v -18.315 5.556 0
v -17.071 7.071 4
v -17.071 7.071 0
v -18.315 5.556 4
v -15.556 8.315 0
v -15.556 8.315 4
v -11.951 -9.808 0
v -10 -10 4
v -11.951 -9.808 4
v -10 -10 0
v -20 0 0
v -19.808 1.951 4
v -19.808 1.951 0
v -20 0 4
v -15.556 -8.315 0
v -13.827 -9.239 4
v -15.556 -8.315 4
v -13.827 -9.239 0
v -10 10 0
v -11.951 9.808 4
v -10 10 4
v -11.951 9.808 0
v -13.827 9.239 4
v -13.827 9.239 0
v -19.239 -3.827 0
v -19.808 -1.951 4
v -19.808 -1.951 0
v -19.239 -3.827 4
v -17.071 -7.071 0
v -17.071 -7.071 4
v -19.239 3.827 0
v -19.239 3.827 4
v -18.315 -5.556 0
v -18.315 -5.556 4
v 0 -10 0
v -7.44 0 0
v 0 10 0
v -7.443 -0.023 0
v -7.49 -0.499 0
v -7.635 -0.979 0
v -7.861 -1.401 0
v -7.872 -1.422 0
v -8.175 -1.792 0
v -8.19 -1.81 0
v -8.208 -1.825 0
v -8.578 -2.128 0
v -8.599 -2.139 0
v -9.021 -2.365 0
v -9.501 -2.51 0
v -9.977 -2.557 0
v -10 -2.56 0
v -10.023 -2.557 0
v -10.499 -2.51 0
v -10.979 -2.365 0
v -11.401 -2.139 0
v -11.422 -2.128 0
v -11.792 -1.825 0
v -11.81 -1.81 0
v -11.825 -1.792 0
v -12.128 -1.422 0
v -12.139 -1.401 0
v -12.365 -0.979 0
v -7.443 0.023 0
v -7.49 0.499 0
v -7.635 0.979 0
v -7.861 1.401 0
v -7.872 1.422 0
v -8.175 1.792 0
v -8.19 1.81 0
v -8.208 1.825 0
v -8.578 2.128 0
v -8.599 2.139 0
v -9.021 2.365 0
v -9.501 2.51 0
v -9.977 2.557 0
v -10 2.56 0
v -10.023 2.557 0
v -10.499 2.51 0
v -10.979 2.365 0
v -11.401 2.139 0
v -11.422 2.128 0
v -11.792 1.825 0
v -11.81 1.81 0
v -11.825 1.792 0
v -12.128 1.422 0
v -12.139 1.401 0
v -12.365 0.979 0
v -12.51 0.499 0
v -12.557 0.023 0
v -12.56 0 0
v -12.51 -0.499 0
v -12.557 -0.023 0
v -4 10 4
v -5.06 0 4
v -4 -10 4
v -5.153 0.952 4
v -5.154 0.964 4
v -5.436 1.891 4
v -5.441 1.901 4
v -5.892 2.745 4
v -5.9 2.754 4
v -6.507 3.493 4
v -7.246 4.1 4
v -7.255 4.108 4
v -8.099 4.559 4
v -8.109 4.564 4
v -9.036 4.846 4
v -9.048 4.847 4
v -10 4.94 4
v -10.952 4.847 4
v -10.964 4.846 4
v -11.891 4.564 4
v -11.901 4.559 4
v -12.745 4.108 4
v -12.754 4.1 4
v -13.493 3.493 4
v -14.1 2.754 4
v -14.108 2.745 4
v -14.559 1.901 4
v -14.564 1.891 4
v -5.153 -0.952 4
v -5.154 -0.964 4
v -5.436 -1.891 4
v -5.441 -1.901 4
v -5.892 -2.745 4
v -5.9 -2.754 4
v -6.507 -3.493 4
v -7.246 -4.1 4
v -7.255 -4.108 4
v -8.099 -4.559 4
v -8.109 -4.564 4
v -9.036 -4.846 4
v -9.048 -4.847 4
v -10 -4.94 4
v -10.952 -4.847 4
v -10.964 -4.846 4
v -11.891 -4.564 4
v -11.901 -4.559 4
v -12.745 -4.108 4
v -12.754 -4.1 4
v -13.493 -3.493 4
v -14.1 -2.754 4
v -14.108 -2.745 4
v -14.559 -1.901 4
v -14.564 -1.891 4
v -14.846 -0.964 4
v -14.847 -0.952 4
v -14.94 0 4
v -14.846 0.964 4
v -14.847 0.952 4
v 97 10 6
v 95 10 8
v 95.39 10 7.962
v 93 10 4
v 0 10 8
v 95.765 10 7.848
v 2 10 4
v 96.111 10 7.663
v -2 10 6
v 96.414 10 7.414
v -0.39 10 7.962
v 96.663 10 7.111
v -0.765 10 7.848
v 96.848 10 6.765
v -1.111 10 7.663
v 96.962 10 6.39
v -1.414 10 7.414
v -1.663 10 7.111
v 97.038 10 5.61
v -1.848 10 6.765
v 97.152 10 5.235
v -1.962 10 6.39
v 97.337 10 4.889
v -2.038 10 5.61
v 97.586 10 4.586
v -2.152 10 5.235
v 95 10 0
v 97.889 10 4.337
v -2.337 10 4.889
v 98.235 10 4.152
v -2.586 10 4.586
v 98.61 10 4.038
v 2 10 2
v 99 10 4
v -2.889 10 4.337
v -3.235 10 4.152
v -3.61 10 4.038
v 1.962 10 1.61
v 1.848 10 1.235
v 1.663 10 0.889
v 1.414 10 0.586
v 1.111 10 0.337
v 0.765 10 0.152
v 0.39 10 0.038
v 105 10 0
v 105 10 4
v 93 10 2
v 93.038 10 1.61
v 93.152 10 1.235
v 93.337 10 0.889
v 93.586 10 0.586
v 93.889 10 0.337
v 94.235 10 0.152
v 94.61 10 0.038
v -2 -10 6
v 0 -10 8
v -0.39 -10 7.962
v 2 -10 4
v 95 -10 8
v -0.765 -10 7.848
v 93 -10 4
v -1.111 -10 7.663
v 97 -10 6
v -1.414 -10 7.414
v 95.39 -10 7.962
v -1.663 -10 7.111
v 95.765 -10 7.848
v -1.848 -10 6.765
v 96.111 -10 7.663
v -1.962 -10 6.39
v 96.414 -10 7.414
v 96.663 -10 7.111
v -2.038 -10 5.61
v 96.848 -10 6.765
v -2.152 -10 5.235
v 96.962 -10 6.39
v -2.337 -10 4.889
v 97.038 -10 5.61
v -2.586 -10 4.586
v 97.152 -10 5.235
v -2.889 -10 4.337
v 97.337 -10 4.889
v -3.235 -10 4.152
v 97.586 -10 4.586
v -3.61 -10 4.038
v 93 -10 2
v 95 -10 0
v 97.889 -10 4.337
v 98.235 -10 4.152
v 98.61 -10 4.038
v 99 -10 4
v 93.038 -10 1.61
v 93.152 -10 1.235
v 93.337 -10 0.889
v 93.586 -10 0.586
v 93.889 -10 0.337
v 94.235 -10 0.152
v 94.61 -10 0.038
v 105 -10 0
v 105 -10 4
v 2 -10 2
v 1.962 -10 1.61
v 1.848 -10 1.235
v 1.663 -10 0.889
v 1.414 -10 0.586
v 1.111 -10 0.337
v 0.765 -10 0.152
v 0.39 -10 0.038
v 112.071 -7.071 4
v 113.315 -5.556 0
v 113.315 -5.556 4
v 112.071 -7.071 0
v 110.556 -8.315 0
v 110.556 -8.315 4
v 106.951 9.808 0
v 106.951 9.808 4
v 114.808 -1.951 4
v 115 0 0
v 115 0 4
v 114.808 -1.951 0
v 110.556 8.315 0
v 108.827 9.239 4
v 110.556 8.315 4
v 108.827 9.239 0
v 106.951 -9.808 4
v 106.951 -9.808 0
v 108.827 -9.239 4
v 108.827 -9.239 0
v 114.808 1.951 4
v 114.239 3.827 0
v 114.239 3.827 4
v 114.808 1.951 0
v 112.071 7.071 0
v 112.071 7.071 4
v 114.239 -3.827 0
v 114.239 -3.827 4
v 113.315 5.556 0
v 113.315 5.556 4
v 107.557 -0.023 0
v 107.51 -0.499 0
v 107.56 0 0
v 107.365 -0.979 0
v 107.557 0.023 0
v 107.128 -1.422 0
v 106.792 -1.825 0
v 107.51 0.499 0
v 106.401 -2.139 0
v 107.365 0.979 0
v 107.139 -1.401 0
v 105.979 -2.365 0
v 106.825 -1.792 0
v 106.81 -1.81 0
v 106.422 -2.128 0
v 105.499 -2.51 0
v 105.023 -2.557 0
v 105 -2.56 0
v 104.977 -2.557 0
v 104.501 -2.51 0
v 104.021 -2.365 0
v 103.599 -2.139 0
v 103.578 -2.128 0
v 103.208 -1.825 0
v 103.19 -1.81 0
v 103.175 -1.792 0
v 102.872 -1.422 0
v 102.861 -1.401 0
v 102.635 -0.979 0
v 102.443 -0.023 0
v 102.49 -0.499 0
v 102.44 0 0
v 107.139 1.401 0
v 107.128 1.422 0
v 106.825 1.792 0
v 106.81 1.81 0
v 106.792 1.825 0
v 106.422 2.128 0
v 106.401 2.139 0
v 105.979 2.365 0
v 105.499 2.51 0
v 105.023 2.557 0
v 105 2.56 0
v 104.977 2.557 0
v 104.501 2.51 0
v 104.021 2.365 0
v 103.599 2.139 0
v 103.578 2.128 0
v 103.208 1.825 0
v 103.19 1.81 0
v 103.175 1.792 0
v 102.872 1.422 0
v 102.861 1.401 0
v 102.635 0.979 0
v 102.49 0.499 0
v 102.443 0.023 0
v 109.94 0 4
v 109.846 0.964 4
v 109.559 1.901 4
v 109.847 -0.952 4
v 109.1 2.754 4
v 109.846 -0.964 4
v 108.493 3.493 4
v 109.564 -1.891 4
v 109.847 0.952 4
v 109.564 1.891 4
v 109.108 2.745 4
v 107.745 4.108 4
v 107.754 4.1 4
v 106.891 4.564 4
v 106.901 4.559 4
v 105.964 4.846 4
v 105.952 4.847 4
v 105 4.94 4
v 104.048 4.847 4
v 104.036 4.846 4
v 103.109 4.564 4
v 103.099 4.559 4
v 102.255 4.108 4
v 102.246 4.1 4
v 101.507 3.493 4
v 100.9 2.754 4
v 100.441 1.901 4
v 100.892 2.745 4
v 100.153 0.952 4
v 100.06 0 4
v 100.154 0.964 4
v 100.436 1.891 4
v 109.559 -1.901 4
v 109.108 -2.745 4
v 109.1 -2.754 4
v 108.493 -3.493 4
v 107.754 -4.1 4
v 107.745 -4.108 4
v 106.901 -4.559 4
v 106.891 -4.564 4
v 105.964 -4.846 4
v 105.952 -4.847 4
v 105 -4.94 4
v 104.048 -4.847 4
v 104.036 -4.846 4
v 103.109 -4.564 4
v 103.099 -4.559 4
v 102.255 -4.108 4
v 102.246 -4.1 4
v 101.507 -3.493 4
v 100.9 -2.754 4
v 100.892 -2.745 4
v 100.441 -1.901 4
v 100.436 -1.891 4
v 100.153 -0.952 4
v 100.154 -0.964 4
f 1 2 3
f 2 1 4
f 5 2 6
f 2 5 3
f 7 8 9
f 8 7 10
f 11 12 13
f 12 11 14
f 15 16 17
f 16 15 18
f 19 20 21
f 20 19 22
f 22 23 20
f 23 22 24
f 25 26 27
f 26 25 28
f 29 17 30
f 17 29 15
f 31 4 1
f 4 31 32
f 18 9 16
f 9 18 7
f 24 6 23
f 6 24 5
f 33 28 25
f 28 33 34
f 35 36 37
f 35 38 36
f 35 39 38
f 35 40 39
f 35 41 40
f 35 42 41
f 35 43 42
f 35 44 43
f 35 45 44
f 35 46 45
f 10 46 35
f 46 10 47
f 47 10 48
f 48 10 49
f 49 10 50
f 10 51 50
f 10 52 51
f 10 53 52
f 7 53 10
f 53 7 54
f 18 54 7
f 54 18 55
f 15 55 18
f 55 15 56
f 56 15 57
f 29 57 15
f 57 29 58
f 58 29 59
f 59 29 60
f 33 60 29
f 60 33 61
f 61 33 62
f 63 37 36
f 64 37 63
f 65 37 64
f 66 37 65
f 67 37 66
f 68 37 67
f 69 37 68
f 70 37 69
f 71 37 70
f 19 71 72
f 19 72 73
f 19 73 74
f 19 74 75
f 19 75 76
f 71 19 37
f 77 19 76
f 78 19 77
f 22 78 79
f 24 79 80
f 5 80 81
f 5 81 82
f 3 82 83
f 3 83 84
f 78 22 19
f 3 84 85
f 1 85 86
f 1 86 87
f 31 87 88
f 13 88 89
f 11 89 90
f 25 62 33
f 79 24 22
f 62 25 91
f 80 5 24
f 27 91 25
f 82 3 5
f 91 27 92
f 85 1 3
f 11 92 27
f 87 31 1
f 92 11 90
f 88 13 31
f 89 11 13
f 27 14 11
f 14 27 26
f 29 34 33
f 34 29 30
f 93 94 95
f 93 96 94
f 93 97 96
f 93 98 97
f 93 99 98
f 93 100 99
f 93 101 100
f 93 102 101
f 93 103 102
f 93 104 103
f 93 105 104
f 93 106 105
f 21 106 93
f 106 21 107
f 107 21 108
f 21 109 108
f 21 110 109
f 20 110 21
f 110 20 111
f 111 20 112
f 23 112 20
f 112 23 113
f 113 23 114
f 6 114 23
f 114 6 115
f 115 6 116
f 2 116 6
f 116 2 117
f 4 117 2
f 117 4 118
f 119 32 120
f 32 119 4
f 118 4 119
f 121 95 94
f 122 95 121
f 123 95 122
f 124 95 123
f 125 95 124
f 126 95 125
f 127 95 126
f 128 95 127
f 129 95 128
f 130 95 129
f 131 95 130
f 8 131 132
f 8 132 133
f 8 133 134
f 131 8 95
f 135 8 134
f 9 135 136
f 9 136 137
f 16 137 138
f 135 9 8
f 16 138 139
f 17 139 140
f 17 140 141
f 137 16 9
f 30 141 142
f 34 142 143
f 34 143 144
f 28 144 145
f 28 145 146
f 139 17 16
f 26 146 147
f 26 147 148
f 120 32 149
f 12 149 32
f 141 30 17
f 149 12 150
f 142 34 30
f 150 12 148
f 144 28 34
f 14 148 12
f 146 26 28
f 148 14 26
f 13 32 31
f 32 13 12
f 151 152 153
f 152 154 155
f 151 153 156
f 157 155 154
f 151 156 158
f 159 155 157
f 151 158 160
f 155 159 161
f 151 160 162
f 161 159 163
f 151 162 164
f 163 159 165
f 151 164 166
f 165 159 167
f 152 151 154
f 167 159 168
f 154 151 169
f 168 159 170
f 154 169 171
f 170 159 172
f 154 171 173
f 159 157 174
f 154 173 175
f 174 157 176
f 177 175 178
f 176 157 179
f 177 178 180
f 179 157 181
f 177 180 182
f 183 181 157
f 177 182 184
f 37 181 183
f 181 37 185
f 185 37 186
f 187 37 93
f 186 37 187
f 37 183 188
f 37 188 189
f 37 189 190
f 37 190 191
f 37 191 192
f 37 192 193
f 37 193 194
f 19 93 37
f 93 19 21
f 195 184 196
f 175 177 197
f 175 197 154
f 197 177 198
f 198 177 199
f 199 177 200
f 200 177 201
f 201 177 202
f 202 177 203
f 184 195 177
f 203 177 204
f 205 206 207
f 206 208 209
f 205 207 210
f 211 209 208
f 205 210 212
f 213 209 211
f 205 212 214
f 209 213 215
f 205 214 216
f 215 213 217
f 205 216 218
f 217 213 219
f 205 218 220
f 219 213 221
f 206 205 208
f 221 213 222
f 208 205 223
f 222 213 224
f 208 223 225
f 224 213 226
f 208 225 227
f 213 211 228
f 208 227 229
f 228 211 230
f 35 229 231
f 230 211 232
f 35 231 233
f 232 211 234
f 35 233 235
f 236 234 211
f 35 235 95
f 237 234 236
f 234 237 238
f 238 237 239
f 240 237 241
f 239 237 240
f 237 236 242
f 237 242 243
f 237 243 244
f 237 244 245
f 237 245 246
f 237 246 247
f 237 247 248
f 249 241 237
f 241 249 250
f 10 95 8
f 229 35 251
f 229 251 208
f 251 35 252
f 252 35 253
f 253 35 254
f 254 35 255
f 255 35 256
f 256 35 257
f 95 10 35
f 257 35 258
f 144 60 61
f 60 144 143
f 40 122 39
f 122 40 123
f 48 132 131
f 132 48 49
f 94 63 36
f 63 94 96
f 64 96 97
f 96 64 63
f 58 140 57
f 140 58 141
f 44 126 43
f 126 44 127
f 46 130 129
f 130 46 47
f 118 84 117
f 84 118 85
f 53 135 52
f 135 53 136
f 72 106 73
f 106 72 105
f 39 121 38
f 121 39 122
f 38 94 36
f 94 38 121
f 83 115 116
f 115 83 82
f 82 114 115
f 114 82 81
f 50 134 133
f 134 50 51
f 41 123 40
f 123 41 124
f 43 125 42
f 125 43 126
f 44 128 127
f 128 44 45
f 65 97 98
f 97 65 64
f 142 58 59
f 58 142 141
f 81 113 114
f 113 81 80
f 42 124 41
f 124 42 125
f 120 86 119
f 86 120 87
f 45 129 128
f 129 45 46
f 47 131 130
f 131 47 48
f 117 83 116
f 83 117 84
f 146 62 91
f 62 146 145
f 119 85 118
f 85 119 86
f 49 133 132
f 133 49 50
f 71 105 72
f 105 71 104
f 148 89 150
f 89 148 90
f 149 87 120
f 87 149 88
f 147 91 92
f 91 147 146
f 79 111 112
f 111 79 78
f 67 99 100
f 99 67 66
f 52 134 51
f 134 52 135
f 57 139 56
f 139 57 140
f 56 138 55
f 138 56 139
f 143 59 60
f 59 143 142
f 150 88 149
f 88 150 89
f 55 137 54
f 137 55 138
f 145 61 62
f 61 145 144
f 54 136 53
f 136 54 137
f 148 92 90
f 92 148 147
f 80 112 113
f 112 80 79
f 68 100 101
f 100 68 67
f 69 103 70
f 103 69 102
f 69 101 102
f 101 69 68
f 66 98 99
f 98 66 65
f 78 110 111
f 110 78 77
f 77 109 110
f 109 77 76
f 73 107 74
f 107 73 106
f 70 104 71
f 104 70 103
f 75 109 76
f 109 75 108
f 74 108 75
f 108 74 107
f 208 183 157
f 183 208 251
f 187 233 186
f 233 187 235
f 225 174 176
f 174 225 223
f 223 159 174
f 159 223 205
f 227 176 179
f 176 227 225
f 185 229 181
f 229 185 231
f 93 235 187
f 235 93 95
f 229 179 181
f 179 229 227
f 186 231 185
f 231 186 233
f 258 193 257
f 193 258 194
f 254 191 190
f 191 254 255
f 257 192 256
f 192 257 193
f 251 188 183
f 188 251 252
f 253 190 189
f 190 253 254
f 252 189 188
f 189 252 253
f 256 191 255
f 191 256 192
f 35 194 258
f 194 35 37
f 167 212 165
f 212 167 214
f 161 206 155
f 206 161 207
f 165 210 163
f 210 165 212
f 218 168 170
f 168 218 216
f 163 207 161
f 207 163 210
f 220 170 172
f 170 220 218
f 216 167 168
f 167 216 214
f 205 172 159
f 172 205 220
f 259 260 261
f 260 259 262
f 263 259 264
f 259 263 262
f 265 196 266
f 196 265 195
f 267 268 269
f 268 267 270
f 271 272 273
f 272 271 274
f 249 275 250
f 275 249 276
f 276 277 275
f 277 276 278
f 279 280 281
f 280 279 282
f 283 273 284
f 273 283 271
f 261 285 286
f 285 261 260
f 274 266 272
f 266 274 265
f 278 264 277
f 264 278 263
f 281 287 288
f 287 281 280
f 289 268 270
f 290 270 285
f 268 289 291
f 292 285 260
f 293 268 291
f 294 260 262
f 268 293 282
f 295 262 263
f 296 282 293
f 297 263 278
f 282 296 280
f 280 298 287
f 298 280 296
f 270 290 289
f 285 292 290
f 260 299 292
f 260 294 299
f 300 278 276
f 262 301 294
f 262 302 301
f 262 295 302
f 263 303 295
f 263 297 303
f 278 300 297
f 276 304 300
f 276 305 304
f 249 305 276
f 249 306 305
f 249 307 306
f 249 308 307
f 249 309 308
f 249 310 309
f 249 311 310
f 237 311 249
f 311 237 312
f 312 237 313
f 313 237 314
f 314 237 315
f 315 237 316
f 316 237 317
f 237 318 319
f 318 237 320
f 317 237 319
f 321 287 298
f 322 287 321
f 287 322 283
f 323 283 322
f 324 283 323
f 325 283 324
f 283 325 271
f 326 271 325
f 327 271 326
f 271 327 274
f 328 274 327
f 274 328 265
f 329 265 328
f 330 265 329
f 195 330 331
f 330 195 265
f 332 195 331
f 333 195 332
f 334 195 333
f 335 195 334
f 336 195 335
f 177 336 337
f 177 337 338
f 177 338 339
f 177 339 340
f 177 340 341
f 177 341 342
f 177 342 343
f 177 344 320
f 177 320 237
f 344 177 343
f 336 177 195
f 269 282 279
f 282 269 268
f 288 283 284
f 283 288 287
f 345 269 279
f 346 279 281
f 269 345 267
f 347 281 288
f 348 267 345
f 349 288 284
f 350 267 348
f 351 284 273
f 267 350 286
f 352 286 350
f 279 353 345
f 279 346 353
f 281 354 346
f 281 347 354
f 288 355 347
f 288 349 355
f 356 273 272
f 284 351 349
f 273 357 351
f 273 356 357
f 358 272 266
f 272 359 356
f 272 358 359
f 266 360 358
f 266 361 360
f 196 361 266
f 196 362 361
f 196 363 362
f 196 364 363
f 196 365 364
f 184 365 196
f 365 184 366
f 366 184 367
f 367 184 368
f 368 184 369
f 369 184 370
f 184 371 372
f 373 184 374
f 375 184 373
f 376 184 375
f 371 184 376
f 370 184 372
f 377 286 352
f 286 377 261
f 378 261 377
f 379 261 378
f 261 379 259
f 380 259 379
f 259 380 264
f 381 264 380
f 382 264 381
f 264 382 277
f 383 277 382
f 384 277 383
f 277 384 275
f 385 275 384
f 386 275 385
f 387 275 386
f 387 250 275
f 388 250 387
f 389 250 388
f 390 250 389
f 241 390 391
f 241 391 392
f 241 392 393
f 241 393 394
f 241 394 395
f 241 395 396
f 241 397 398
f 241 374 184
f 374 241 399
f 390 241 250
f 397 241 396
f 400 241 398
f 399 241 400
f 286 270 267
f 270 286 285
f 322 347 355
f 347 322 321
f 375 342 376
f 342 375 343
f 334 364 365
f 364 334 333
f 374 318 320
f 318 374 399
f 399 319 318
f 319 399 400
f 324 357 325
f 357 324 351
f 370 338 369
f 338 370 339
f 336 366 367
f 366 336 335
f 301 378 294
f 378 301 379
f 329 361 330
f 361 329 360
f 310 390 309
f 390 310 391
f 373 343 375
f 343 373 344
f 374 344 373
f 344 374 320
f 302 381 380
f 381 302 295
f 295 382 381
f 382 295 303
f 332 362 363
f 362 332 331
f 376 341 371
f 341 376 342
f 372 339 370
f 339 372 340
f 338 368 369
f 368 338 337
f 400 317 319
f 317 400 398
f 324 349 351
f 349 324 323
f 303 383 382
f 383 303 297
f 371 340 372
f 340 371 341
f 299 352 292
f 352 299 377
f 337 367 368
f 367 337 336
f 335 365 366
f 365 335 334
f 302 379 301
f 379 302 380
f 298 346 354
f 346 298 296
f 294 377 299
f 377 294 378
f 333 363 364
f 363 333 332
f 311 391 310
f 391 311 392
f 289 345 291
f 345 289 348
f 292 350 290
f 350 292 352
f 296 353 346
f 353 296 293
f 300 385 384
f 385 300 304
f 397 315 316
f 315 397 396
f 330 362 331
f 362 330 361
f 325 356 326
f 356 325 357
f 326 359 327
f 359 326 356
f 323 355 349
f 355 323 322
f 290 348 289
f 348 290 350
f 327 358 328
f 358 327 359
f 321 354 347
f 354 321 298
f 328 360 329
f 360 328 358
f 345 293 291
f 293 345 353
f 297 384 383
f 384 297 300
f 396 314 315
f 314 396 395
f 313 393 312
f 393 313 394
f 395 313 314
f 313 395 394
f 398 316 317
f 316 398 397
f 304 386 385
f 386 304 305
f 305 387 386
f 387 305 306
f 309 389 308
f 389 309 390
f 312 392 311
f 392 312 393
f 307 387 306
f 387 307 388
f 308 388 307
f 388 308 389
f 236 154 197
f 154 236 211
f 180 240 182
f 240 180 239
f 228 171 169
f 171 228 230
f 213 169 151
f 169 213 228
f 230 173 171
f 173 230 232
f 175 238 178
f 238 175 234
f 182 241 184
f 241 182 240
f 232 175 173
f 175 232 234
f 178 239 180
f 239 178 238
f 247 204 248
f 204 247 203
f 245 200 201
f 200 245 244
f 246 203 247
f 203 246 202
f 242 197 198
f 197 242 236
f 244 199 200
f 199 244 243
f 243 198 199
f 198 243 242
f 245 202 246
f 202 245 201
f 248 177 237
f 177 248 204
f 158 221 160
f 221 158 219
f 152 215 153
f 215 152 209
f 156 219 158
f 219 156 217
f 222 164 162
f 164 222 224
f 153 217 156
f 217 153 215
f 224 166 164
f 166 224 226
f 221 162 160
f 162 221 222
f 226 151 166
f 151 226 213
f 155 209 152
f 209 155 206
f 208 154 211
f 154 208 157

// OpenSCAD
$fn=32;

//translate([2,-10,0]) color("red") cube([91,20,4]);


ear();
translate([0,-10,4]) cube([95,20,4]);
translate([95,0,0]) rotate([0,0,180]) ear();

module ear() {
  translate([-10,0,0]) {
    difference() {
      union() {
        cylinder(r=10,h=4);
        translate([0,-10,0]) cube([10,20,4]);
      }
      translate([0,0,-0.1]) cylinder(r1=2.5, r2=5, h=4.2);
    }
    translate([10,10,2]) rotate([90,0,0]) cylinder(r=2,h=20); 
    translate([10,-10,2]) cube([2,20,2]);
    translate([6,-10,4]) difference() {
      cube([6,20,2]);
      translate([0,-1,2]) rotate([-90,0,0]) cylinder(r=2,h=22);
    }
    translate([10,-10,6]) rotate([-90,0,0]) cylinder(r=2,h=20);
  }
}
